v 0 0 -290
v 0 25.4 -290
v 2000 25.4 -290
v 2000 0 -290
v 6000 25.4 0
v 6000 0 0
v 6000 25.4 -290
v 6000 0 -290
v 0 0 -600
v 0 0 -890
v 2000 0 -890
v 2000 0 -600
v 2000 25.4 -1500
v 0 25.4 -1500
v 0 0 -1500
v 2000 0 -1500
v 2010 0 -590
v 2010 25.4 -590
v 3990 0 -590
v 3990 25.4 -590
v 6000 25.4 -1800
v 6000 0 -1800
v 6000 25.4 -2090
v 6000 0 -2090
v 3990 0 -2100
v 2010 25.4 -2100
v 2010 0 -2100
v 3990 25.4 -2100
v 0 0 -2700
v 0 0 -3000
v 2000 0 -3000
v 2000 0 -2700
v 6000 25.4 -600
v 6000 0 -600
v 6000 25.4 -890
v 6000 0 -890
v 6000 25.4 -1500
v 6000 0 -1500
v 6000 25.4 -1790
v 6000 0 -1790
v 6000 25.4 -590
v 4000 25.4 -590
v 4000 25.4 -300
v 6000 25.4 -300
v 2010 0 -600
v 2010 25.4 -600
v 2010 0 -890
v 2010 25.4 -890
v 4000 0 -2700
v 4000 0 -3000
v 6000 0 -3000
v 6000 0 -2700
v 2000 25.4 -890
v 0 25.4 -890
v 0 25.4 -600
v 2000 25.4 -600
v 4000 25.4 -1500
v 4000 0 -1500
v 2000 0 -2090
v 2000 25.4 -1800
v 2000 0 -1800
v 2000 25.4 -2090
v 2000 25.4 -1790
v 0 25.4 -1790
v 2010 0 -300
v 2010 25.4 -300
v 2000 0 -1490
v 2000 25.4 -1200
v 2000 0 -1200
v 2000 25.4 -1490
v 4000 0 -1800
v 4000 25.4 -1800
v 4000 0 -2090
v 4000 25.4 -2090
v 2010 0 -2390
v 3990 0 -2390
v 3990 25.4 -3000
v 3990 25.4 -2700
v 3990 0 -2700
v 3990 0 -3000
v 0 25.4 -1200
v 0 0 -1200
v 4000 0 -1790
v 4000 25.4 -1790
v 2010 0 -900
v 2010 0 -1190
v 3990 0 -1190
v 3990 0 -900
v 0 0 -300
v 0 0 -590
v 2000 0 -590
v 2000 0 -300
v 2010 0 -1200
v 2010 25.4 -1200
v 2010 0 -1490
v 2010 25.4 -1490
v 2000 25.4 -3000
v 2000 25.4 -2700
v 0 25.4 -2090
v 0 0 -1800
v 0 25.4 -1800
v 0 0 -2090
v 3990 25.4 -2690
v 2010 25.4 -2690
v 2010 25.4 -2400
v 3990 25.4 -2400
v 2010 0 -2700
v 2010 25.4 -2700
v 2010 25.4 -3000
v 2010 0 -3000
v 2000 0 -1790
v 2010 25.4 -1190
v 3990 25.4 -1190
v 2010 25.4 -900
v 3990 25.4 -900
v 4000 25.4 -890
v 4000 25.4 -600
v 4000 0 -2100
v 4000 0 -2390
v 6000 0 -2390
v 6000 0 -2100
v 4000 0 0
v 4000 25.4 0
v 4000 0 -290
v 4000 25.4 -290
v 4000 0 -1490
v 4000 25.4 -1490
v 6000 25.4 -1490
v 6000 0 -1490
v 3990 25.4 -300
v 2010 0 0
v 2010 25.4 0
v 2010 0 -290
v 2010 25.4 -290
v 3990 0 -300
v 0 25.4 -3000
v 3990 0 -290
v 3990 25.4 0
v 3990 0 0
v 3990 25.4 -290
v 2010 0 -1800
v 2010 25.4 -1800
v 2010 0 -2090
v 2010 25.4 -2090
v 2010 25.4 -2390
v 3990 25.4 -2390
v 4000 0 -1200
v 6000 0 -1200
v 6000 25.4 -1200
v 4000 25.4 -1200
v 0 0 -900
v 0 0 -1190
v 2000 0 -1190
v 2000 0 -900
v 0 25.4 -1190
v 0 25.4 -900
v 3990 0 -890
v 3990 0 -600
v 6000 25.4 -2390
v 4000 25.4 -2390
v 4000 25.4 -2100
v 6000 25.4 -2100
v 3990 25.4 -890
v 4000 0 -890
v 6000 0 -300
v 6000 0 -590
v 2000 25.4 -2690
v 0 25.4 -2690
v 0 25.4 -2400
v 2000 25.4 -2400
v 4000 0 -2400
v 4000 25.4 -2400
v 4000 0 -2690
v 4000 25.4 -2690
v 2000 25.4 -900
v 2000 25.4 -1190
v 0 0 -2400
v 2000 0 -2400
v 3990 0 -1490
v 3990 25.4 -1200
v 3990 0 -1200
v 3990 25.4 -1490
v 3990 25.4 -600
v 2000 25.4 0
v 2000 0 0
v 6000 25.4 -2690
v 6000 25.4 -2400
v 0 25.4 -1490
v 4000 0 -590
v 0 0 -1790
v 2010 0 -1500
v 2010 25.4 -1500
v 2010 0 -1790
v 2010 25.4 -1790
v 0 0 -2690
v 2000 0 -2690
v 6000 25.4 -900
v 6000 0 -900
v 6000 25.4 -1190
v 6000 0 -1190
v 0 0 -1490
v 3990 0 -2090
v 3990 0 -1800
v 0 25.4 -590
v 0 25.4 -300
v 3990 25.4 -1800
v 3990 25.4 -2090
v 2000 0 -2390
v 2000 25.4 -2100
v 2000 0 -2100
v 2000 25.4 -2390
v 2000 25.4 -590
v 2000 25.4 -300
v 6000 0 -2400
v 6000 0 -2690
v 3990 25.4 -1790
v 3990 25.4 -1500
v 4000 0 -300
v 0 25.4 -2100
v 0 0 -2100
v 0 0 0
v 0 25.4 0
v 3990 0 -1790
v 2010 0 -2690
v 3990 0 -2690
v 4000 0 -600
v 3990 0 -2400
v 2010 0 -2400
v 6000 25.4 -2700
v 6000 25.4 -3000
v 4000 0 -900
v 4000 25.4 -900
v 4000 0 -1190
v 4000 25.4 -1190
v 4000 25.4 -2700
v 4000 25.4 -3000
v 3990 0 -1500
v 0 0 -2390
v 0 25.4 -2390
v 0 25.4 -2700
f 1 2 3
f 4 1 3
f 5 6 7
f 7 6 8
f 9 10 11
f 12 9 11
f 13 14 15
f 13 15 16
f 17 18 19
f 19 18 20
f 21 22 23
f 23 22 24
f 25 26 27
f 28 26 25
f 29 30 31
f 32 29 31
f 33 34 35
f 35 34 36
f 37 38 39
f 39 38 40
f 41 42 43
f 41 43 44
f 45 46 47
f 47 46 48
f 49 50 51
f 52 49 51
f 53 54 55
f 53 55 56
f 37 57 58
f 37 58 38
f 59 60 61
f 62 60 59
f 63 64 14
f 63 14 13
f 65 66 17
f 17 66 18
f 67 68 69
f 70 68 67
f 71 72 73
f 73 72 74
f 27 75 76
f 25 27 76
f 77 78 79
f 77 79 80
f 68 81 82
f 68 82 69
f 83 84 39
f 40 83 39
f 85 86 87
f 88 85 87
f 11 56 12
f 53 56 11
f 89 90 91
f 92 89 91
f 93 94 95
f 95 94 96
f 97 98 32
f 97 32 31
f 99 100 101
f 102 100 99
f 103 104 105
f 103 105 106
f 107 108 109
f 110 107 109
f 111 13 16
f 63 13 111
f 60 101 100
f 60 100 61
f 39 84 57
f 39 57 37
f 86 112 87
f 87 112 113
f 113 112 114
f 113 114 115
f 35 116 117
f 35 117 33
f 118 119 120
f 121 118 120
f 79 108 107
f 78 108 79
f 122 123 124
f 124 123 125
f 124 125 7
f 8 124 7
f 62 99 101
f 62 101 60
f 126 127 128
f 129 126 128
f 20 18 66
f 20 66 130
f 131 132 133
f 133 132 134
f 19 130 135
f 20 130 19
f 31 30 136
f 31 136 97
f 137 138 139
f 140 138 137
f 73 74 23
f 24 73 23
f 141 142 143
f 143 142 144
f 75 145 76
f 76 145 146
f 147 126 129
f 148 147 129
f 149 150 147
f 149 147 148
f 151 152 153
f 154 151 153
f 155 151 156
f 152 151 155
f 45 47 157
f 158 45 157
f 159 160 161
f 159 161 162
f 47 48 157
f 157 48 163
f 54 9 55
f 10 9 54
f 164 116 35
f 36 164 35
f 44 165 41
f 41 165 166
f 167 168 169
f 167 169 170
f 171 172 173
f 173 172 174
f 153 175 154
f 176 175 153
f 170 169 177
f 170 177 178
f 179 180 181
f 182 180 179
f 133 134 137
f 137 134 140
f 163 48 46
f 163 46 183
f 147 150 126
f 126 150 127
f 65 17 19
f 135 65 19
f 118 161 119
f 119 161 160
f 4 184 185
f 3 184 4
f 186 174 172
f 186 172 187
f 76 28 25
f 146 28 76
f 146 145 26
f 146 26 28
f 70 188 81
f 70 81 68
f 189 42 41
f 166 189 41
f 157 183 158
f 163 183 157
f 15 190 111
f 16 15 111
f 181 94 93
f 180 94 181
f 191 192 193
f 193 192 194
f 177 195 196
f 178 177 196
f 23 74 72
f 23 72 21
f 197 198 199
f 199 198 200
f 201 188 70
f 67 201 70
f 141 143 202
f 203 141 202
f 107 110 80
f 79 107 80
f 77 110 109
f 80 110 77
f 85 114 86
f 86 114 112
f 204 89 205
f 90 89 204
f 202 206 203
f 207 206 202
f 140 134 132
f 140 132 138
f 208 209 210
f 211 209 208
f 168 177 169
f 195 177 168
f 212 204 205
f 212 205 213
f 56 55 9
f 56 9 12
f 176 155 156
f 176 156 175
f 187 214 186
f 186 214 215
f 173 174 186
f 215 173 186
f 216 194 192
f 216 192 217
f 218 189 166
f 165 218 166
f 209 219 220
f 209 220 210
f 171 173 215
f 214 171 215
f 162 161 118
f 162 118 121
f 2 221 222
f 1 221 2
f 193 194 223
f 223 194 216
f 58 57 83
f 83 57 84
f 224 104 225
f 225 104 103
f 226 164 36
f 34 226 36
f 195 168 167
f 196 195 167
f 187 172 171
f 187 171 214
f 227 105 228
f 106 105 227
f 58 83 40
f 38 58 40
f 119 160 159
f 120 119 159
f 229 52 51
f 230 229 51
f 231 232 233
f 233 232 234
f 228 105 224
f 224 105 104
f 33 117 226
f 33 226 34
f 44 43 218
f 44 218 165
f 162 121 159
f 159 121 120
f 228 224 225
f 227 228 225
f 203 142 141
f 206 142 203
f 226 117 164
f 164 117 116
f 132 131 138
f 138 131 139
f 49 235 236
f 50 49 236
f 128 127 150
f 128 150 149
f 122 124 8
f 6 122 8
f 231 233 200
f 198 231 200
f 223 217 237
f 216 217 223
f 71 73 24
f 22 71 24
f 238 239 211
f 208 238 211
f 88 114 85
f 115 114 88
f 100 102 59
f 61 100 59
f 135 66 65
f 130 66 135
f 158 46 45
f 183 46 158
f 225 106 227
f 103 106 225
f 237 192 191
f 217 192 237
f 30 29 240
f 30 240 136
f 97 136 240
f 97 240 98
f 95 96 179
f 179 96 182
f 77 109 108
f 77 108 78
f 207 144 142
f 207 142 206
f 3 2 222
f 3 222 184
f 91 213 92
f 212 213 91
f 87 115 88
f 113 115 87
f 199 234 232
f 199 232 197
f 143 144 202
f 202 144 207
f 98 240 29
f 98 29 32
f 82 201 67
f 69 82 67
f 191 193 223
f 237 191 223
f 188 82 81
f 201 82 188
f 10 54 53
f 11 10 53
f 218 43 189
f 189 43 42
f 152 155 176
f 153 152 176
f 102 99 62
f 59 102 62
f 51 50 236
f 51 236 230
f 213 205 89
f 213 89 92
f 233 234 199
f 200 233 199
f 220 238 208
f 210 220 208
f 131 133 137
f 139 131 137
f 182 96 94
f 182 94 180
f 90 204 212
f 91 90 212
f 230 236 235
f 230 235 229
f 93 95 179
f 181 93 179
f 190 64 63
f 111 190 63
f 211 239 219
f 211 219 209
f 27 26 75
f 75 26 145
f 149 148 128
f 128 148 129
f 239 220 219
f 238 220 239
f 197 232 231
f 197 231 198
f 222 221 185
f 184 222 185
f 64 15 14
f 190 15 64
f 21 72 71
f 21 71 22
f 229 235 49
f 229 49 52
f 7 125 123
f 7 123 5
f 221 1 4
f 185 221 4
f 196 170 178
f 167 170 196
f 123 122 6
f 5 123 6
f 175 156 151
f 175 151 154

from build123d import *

# Parameters (mm, degrees)
SKETCH_2_W          = 6000
SKETCH_2_H          = 3000
EXTRUDE_1_DEPTH     = 25.4
SKETCH_3_W          = 6000
SKETCH_3_H          = 10
CUT_EXTRUDE_1_DEPTH = 26.4
SKETCH_4_W          = 10
SKETCH_4_H          = 3000
CUT_EXTRUDE_2_DEPTH = 25.4


with BuildPart() as part:
    # 草图2 → 凸台-拉伸1 (new body)
    with BuildSketch(Plane(origin=(0, 0, 0), x_dir=(1, 0, 0), z_dir=(0, 1, 0))):
        with Locations((3000, 1500)):
            Rectangle(SKETCH_2_W, SKETCH_2_H)
    extrude(amount=EXTRUDE_1_DEPTH)

    # 草图3 → 切除-拉伸1 (cut, through all)
    with BuildSketch(Plane(origin=(0, 25.4, 0), x_dir=(1, 0, 0), z_dir=(0, 1, 0))):
        with Locations((3000, 2695)):
            Rectangle(SKETCH_3_W, SKETCH_3_H)
        with Locations((3000, 2395)):
            Rectangle(SKETCH_3_W, SKETCH_3_H)
        with Locations((3000, 2095)):
            Rectangle(SKETCH_3_W, SKETCH_3_H)
        with Locations((3000, 1795)):
            Rectangle(SKETCH_3_W, SKETCH_3_H)
        with Locations((3000, 1495)):
            Rectangle(SKETCH_3_W, SKETCH_3_H)
        with Locations((3000, 895)):
            Rectangle(SKETCH_3_W, SKETCH_3_H)
        with Locations((3000, 1195)):
            Rectangle(SKETCH_3_W, SKETCH_3_H)
        with Locations((3000, 595)):
            Rectangle(SKETCH_3_W, SKETCH_3_H)
        with Locations((3000, 295)):
            Rectangle(SKETCH_3_W, SKETCH_3_H)
    extrude(amount=-CUT_EXTRUDE_1_DEPTH, mode=Mode.SUBTRACT)

    # 草图4 → 切除-拉伸2 (cut)
    with BuildSketch(Plane(origin=(0, 25.4, 0), x_dir=(1, 0, 0), z_dir=(0, 1, 0))):
        with Locations((2005, 1500)):
            Rectangle(SKETCH_4_W, SKETCH_4_H)
        with Locations((3995, 1500)):
            Rectangle(SKETCH_4_W, SKETCH_4_H)
    extrude(amount=-CUT_EXTRUDE_2_DEPTH, mode=Mode.SUBTRACT)


solid = part.part
